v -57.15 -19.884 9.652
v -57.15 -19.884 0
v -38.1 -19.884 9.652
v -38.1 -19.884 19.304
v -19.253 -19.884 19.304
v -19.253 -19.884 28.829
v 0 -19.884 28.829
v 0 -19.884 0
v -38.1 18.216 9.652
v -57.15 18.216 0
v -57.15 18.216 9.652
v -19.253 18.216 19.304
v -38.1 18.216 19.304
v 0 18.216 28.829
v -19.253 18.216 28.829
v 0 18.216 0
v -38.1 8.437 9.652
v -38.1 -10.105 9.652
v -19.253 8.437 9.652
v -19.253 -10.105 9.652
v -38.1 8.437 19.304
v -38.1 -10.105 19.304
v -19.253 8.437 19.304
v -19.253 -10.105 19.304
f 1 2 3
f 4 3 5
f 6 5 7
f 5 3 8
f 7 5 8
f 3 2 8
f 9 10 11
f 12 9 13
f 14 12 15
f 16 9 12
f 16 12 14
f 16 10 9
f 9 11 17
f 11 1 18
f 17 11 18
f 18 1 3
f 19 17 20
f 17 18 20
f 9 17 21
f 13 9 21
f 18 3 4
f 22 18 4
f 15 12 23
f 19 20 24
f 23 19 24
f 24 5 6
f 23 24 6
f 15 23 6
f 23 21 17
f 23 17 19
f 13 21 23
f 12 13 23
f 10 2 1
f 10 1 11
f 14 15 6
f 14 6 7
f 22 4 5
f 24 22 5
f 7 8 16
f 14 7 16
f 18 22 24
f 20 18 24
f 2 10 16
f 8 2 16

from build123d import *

# Parameters (mm, degrees)
F0_W     = 57.15
F0_H     = 38.1
F1_DEPTH = 28.829
F2_W     = 18.8468
F2_H     = 9.525
F3_DEPTH = 38.101
F4_W     = 18.8468
F4_H     = 18.542
F5_DEPTH = 9.652


with BuildPart() as f1:
    # F0 (on Top) → F1 (new body)
    with BuildSketch(Plane.XY):
        with Locations((-28.575, -0.834305)):
            Rectangle(F0_W, F0_H)
    extrude(amount=F1_DEPTH)

    # F2 (on face) → F3 (cut, through all)
    with BuildSketch(Plane.XZ.offset(19.884305)):
        Polygon((-57.15, 28.829), (-57.15, 9.652), (-38.1, 9.652), (-38.1, 19.2405), (-38.1, 19.304), (-38.1, 28.829), align=None)
        with Locations((-28.6766, 24.0665)):
            Rectangle(F2_W, F2_H)
    extrude(amount=-F3_DEPTH, mode=Mode.SUBTRACT)

    # F4 (on face) → F5 (cut)
    with BuildSketch(Plane.XY.offset(19.304)):
        with Locations((-28.6766, -0.834305)):
            Rectangle(F4_W, F4_H)
    extrude(amount=-F5_DEPTH, mode=Mode.SUBTRACT)


solid = f1.part
